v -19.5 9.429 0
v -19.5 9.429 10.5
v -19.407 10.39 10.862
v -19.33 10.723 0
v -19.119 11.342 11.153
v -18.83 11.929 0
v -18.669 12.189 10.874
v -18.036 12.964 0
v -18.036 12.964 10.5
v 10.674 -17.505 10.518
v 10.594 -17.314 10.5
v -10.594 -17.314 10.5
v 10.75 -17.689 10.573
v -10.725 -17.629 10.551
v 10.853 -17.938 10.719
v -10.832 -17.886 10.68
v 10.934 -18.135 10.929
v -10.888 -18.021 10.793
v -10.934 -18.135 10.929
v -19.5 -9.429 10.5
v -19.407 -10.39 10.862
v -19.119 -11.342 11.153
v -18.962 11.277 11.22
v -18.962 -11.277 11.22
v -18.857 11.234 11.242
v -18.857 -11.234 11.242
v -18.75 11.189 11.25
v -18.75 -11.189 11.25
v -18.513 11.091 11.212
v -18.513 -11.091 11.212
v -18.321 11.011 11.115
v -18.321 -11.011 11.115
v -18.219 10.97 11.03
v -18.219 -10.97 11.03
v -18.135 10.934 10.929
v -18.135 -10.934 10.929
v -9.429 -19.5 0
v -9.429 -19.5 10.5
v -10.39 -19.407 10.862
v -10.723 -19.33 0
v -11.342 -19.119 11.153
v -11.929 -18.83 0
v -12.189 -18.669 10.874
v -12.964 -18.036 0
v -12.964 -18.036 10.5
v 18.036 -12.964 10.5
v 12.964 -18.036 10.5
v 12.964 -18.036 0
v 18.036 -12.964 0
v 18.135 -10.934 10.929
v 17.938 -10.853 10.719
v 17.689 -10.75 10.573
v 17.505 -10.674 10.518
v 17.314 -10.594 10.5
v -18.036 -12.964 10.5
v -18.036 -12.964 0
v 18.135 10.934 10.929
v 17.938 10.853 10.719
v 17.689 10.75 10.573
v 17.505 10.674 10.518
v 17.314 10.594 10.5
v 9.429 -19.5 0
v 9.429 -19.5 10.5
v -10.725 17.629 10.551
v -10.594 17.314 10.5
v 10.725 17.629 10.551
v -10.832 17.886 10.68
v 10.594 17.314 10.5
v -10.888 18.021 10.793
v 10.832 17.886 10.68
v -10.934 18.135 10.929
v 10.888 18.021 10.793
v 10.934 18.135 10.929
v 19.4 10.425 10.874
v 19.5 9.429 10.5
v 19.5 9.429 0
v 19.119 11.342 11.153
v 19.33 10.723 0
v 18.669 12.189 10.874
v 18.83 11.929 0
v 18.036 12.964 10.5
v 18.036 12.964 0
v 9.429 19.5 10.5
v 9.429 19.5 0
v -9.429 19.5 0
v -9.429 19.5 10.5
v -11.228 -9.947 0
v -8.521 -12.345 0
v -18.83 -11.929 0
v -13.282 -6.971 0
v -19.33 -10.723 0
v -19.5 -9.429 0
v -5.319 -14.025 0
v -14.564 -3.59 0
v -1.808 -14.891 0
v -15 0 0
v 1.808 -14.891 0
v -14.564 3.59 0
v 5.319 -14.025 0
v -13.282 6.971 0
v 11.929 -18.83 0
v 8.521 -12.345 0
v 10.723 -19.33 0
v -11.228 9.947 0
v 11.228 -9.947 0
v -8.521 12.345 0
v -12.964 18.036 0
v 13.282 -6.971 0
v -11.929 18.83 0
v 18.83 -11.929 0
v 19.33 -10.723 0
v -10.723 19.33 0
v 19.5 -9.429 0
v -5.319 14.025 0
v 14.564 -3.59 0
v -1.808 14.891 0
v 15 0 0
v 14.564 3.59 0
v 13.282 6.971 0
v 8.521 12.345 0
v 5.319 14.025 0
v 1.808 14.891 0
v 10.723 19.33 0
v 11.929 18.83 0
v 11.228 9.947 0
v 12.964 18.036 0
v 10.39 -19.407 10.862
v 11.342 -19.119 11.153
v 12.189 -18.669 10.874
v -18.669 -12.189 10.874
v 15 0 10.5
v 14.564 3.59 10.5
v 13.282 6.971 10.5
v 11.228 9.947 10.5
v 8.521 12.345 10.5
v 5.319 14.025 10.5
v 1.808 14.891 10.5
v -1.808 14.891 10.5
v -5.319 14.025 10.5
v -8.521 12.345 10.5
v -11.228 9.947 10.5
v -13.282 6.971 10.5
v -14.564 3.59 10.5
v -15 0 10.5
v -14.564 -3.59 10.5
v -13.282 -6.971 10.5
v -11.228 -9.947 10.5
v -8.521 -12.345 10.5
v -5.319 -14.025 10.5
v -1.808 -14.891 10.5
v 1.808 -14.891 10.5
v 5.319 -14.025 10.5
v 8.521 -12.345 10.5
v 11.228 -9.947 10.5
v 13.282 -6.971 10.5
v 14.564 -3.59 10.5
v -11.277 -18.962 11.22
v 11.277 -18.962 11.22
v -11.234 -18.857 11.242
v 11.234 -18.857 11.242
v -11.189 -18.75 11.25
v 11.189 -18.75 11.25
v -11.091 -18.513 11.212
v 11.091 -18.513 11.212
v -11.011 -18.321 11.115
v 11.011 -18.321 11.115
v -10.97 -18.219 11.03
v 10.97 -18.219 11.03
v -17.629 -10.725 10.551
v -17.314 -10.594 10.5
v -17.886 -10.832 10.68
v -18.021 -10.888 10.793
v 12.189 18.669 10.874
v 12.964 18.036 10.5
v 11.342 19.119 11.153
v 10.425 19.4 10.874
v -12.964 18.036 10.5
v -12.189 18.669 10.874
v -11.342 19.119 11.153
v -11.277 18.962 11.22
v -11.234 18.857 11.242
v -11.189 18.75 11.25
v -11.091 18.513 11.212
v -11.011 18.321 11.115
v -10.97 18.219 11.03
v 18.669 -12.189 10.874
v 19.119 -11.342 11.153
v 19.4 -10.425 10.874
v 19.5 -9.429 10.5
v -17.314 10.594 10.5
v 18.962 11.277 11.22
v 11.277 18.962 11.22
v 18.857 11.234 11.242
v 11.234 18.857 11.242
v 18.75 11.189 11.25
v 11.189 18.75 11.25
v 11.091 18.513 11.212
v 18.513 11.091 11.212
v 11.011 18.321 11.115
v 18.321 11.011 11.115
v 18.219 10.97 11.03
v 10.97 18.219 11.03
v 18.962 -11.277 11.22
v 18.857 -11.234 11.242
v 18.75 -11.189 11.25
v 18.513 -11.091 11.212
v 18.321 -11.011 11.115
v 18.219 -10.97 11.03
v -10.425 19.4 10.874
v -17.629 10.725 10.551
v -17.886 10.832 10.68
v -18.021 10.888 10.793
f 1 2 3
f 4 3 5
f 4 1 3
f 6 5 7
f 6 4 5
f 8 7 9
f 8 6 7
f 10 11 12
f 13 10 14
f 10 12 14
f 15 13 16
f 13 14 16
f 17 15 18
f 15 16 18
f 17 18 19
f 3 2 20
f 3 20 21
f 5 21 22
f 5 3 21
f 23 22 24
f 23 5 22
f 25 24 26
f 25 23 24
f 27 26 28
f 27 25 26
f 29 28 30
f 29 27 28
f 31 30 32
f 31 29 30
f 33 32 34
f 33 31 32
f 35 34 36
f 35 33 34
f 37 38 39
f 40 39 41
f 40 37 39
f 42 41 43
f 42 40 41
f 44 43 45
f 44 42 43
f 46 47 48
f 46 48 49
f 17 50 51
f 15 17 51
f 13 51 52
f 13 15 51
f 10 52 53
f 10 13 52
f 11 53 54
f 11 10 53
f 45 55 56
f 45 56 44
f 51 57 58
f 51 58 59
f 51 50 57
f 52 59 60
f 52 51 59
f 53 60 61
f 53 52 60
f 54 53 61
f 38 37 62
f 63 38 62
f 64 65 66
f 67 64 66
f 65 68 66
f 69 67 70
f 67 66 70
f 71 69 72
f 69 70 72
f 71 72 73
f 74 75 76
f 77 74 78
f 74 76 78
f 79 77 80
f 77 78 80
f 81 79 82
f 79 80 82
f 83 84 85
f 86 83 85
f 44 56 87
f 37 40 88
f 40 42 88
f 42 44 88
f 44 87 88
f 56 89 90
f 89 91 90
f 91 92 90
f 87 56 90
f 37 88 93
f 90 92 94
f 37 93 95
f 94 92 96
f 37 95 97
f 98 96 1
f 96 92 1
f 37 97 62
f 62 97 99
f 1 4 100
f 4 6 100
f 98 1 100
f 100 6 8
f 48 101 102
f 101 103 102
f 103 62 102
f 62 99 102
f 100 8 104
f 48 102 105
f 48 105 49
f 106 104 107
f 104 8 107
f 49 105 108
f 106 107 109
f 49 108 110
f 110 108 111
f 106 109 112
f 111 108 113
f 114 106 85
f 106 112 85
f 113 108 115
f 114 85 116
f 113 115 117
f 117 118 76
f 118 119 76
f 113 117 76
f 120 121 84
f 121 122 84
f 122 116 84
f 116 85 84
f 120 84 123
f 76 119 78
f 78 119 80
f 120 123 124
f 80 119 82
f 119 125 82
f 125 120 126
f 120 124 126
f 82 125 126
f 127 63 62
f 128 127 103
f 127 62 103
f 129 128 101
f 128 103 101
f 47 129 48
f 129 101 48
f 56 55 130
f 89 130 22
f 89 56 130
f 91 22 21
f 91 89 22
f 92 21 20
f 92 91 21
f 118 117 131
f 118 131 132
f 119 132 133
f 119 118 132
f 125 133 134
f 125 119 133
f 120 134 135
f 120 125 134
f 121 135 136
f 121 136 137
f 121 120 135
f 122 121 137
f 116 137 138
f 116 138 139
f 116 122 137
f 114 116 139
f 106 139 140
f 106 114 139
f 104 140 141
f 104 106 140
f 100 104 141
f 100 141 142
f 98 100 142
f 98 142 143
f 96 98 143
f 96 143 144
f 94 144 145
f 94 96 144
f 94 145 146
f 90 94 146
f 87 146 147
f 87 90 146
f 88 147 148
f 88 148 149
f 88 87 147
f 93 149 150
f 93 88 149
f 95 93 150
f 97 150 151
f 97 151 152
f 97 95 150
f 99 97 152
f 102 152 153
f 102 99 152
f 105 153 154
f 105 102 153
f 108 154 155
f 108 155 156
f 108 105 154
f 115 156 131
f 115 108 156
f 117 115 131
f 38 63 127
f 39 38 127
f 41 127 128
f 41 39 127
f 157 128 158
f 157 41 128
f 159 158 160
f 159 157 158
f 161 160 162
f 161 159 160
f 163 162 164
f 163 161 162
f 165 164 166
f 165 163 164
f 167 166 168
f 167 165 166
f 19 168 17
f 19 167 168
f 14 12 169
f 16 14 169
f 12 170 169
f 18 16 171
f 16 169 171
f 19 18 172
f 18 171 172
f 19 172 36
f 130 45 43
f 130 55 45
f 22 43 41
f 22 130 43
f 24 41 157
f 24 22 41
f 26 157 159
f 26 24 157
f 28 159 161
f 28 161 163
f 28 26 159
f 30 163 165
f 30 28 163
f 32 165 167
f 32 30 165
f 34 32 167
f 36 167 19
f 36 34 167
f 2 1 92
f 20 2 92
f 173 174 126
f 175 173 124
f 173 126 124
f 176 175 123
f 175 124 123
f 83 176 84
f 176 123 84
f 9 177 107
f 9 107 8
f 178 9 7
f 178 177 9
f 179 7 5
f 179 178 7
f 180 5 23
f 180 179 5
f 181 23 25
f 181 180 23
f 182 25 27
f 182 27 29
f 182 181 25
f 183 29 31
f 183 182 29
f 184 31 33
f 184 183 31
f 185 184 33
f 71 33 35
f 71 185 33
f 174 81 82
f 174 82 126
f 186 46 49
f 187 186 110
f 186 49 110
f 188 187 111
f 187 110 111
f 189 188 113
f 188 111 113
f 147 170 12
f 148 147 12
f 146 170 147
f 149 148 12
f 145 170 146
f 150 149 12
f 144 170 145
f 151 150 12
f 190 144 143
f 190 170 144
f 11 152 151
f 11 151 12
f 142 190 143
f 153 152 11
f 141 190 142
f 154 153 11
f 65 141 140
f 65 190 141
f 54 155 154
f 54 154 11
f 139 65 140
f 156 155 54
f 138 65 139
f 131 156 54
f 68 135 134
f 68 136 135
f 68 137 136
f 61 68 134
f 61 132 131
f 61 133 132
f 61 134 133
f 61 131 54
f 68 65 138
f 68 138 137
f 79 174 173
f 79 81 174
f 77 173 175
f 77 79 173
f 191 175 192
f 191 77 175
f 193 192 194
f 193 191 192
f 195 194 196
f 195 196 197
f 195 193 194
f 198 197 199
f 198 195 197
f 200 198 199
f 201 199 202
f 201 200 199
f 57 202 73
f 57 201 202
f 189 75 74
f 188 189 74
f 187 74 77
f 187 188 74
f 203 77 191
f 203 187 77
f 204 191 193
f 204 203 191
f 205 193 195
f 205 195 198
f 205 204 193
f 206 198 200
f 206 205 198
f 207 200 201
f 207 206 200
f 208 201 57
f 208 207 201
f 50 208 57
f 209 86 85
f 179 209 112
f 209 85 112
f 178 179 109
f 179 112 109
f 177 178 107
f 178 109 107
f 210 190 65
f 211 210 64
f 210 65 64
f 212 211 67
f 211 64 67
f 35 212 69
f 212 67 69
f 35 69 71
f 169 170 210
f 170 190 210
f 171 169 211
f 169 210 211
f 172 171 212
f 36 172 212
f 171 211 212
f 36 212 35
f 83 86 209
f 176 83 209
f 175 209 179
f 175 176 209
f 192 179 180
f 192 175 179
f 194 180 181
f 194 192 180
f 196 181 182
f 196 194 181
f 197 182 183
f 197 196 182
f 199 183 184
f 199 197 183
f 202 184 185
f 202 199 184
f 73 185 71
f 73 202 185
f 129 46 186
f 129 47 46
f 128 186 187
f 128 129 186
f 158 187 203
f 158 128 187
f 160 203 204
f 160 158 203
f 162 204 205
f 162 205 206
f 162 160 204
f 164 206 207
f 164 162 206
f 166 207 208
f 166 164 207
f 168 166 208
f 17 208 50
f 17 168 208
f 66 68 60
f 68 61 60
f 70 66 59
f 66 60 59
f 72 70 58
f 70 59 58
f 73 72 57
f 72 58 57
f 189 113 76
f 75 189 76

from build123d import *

# Parameters (mm, degrees)
F0_R        = 15
F1_DEPTH    = 10.5
F3_R        = 0.75
F5_R        = 1
F6_T1_DEPTH = 20.8553390593


# Not quite as in the source:
# - a fillet or chamfer that OpenCascade refuses, or shapes differently, is made with other operations: its cross-section is extruded or revolved along the edge and cut away or added


with BuildPart() as f1:
    # F0 (on Top) → F1 (new body)
    with BuildSketch(Plane.XY):
        Polygon((-11.5, -19.5), (11.5, -19.5), (19.5, -11.5), (19.5, 11.5), (11.5, 19.5), (-11.5, 19.5), (-19.5, 11.5), (-19.5, -11.5), align=None)
        Circle(F0_R, mode=Mode.SUBTRACT)
    extrude(amount=F1_DEPTH)

    # F4: sweep along a path in F2
    with BuildLine(Plane.XY.offset(10.5)) as f4_path:
        Line((18.75, 11.1893398282), (18.75, -11.1893398282))
        Line((18.75, -11.1893398282), (11.1893398282, -18.75))
        Line((11.1893398282, -18.75), (-11.1893398282, -18.75))
        Line((-11.1893398282, -18.75), (-18.75, -11.1893398282))
        Line((-18.75, -11.1893398282), (-18.75, 11.1893398282))
        Line((-18.75, 11.1893398282), (-11.1893398282, 18.75))
        Line((-11.1893398282, 18.75), (11.1893398282, 18.75))
        Line((11.1893398282, 18.75), (18.75, 11.1893398282))
    # F3 (on Front) → F4 (sweep)
    with BuildSketch(Plane.XZ):
        with Locations((18.75, 10.5)):
            Circle(F3_R)
    sweep(path=f4_path.line, transition=Transition.RIGHT)

    # F5
    f5_edges = [f1.edges().sort_by_distance(p)[0] for p in [
        (18, 0, 10.5),
        (14.43934, -14.43934, 10.5),
        (0, -18, 10.5),
        (-14.43934, -14.43934, 10.5),
        (-18, 0, 10.5),
        (-14.43934, 14.43934, 10.5),
        (0, 18, 10.5),
        (14.43934, 14.43934, 10.5),
    ]]
    fillet(f5_edges, radius=F5_R)

    # F6: fillet of radius 5 on 8 edges, made by hand

    # F6_s2 → F6_t1 (cut)
    with BuildSketch(Plane.XY.offset(-5.1776695297)):
        with BuildLine():
            ThreePointArc((-18.0355339059, -12.9644660941), (-19.1193976626, -11.34234935), (-19.5, -9.4289321881))
            Line((-19.5, -9.4289321881), (-19.5, -11.5))
            Line((-19.5, -11.5), (-18.0355339059, -12.9644660941))
        make_face()
        with BuildLine():
            ThreePointArc((-9.4289321881, -19.5), (-11.34234935, -19.1193976626), (-12.9644660941, -18.0355339059))
            Line((-12.9644660941, -18.0355339059), (-11.5, -19.5))
            Line((-11.5, -19.5), (-9.4289321881, -19.5))
        make_face()
        with BuildLine():
            ThreePointArc((9.4289321881, -19.5), (11.34234935, -19.1193976626), (12.9644660941, -18.0355339059))
            Line((12.9644660941, -18.0355339059), (11.5, -19.5))
            Line((11.5, -19.5), (9.4289321881, -19.5))
        make_face()
        with BuildLine():
            ThreePointArc((18.0355339059, -12.9644660941), (19.1193976626, -11.34234935), (19.5, -9.4289321881))
            Line((19.5, -9.4289321881), (19.5, -11.5))
            Line((19.5, -11.5), (18.0355339059, -12.9644660941))
        make_face()
        with BuildLine():
            ThreePointArc((-9.4289321881, 19.5), (-11.34234935, 19.1193976626), (-12.9644660941, 18.0355339059))
            Line((-12.9644660941, 18.0355339059), (-11.5, 19.5))
            Line((-11.5, 19.5), (-9.4289321881, 19.5))
        make_face()
        with BuildLine():
            ThreePointArc((-19.5, 9.4289321881), (-19.1193976626, 11.34234935), (-18.0355339059, 12.9644660941))
            Line((-18.0355339059, 12.9644660941), (-19.5, 11.5))
            Line((-19.5, 11.5), (-19.5, 9.4289321881))
        make_face()
        with BuildLine():
            ThreePointArc((12.9644660941, 18.0355339059), (11.34234935, 19.1193976626), (9.4289321881, 19.5))
            Line((9.4289321881, 19.5), (11.5, 19.5))
            Line((11.5, 19.5), (12.9644660941, 18.0355339059))
        make_face()
        with BuildLine():
            ThreePointArc((19.5, 9.4289321881), (19.1193976626, 11.34234935), (18.0355339059, 12.9644660941))
            Line((18.0355339059, 12.9644660941), (19.5, 11.5))
            Line((19.5, 11.5), (19.5, 9.4289321881))
        make_face()
    extrude(amount=F6_T1_DEPTH, mode=Mode.SUBTRACT)


solid = f1.part
